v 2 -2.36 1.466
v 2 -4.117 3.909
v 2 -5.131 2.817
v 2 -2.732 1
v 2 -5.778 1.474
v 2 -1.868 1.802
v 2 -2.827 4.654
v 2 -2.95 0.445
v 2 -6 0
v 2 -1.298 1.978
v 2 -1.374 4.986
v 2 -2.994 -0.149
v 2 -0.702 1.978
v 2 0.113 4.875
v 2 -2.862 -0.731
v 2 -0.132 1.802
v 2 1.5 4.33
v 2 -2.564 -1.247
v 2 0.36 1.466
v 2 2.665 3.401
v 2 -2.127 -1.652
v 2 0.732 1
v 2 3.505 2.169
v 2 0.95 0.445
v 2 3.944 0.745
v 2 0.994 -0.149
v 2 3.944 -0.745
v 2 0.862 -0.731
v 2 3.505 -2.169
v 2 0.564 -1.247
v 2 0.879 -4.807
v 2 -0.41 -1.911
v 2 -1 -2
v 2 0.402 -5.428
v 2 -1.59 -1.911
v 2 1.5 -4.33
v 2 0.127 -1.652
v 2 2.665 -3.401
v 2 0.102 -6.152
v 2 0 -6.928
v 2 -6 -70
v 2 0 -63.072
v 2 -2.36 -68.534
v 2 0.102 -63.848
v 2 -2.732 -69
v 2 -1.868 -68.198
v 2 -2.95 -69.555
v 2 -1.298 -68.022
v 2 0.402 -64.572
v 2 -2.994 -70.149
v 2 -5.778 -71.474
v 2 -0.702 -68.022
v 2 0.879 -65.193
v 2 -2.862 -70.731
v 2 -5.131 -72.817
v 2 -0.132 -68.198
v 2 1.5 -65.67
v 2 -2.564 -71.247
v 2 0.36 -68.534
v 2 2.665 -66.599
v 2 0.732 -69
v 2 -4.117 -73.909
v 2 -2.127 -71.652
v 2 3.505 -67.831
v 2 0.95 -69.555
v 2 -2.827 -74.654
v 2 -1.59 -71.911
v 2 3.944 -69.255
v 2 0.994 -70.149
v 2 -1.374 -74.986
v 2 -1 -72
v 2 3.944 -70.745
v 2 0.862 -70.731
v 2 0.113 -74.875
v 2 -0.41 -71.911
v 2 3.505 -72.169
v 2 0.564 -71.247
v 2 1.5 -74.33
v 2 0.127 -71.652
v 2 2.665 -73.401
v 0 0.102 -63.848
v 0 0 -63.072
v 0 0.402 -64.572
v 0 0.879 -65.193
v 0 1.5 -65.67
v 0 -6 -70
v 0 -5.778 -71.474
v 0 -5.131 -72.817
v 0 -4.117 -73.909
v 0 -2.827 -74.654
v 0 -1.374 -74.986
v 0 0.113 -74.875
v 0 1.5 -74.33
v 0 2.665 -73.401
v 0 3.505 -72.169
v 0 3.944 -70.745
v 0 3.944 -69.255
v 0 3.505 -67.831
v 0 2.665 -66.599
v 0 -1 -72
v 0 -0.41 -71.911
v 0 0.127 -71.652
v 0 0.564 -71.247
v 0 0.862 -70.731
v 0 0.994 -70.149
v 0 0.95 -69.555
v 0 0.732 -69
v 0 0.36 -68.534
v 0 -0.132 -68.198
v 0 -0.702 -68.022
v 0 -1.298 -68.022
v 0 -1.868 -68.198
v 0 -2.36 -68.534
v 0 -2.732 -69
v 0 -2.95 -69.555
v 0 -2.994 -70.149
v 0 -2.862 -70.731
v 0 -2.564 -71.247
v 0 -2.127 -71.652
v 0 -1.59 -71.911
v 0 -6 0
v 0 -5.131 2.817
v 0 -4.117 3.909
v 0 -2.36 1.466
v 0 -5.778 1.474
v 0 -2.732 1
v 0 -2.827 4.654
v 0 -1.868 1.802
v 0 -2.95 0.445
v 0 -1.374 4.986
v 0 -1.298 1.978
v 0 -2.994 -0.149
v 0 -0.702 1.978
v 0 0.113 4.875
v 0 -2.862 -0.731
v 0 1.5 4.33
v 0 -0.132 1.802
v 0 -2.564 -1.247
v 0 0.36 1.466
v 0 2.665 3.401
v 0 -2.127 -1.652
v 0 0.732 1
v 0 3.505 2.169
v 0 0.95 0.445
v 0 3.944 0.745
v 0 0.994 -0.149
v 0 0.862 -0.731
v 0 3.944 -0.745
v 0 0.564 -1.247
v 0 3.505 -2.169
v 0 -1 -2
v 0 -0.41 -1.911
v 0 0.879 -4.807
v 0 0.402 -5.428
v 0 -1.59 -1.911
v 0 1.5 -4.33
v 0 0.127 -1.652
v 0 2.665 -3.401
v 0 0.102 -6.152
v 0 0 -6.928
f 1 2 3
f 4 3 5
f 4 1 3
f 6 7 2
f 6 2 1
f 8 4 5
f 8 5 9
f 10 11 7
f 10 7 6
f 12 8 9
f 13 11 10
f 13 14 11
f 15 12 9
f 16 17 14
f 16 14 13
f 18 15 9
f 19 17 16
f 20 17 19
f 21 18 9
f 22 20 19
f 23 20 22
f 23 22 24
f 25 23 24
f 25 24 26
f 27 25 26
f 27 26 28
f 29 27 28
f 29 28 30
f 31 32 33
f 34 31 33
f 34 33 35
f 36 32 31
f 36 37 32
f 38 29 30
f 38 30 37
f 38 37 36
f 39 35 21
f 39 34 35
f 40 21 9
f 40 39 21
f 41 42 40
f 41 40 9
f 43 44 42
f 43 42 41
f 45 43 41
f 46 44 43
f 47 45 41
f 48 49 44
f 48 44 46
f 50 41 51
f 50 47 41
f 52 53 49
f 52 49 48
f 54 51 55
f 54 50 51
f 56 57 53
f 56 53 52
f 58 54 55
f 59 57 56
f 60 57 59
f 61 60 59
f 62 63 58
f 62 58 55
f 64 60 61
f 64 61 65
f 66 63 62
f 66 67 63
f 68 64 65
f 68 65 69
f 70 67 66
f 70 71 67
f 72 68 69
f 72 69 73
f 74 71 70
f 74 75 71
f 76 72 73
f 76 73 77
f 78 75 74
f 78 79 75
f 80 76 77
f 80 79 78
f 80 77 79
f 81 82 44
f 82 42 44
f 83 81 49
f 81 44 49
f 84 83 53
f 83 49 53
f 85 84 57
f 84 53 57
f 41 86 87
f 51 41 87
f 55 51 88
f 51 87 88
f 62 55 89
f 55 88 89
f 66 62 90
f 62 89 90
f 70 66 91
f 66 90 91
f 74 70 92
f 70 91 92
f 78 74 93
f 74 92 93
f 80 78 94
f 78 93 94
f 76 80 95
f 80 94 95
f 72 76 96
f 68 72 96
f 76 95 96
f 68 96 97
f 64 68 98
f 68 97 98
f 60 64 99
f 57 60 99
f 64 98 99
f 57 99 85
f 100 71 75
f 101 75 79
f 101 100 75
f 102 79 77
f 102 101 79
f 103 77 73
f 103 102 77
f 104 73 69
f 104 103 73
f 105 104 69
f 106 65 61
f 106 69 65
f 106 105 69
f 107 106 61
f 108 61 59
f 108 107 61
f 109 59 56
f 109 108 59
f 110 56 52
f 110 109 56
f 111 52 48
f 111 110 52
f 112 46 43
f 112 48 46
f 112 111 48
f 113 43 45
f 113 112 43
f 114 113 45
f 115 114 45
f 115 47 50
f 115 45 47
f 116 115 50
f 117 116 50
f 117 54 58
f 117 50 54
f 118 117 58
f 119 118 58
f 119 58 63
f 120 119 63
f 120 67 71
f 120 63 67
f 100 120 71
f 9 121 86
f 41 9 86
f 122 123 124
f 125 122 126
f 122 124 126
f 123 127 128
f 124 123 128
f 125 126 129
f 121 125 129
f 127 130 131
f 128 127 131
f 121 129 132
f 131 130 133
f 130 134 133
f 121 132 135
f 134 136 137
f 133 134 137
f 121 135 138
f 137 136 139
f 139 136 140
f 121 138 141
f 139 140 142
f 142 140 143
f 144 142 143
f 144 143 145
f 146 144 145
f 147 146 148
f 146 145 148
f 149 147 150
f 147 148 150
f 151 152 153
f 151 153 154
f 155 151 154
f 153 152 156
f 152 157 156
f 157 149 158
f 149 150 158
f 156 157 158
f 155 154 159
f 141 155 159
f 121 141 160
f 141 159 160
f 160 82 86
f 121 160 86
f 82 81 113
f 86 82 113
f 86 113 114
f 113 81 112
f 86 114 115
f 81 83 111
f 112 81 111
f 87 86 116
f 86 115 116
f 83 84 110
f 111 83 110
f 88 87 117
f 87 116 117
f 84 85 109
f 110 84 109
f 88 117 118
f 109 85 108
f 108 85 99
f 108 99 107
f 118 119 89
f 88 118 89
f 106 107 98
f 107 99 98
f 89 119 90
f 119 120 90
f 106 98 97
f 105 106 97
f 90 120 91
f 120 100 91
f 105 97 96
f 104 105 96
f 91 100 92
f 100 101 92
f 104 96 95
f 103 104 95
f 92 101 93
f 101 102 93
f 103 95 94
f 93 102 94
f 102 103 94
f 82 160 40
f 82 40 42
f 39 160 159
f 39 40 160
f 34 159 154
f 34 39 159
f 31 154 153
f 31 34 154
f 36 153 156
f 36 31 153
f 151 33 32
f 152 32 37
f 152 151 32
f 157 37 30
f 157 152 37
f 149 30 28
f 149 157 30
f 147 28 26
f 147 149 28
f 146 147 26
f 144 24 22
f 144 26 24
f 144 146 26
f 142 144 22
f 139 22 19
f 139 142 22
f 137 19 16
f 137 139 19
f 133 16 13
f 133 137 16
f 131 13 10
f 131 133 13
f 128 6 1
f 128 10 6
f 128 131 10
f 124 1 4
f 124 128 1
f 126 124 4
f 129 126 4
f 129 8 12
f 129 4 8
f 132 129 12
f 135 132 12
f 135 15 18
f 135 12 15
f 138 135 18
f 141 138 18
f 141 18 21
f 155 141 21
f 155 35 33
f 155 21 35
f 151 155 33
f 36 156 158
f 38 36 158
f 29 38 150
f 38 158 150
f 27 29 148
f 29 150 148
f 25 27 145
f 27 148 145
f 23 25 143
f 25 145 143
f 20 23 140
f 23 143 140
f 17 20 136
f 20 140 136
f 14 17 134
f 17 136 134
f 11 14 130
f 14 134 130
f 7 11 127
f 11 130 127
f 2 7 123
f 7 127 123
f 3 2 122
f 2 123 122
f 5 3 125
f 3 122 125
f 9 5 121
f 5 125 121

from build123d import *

# Parameters (mm, degrees)
SKETCH_1_R          = 5
SKETCH_1_W          = 70
SKETCH_1_H          = 6
EXTRUDE_1_DEPTH     = 2
SKETCH_1_3_R        = 2
CUT_EXTRUDE_1_DEPTH = 76.266194271
FILLET_1_R          = 3


with BuildPart() as part:
    # 草图1 → 凸台-拉伸1 (new body)
    with BuildSketch(Plane(origin=(0, 0, 0), x_dir=(0, 0, -1), z_dir=(1, 0, 0))):
        with Locations((70, -1)):
            Circle(SKETCH_1_R)
        with Locations((0, -1)):
            Circle(SKETCH_1_R)
        with Locations((35, -3)):
            Rectangle(SKETCH_1_W, SKETCH_1_H)
    extrude(amount=EXTRUDE_1_DEPTH)

    # 草图1<3> → 切除-拉伸1 (cut, through all)
    with BuildSketch(Plane(origin=(0, 0, 0), x_dir=(0, 0, -1), z_dir=(1, 0, 0))):
        with Locations((70, -1)):
            Circle(SKETCH_1_3_R)
        with Locations((0, -1)):
            Circle(SKETCH_1_3_R)
    extrude(amount=CUT_EXTRUDE_1_DEPTH, mode=Mode.SUBTRACT)

    # 圆角1
    fillet_1_edges = [part.edges().sort_by_distance(p)[0] for p in [
        (1, 0, -65.101020514),
        (1, 0, -4.898979486),
    ]]
    fillet(fillet_1_edges, radius=FILLET_1_R)


solid = part.part
